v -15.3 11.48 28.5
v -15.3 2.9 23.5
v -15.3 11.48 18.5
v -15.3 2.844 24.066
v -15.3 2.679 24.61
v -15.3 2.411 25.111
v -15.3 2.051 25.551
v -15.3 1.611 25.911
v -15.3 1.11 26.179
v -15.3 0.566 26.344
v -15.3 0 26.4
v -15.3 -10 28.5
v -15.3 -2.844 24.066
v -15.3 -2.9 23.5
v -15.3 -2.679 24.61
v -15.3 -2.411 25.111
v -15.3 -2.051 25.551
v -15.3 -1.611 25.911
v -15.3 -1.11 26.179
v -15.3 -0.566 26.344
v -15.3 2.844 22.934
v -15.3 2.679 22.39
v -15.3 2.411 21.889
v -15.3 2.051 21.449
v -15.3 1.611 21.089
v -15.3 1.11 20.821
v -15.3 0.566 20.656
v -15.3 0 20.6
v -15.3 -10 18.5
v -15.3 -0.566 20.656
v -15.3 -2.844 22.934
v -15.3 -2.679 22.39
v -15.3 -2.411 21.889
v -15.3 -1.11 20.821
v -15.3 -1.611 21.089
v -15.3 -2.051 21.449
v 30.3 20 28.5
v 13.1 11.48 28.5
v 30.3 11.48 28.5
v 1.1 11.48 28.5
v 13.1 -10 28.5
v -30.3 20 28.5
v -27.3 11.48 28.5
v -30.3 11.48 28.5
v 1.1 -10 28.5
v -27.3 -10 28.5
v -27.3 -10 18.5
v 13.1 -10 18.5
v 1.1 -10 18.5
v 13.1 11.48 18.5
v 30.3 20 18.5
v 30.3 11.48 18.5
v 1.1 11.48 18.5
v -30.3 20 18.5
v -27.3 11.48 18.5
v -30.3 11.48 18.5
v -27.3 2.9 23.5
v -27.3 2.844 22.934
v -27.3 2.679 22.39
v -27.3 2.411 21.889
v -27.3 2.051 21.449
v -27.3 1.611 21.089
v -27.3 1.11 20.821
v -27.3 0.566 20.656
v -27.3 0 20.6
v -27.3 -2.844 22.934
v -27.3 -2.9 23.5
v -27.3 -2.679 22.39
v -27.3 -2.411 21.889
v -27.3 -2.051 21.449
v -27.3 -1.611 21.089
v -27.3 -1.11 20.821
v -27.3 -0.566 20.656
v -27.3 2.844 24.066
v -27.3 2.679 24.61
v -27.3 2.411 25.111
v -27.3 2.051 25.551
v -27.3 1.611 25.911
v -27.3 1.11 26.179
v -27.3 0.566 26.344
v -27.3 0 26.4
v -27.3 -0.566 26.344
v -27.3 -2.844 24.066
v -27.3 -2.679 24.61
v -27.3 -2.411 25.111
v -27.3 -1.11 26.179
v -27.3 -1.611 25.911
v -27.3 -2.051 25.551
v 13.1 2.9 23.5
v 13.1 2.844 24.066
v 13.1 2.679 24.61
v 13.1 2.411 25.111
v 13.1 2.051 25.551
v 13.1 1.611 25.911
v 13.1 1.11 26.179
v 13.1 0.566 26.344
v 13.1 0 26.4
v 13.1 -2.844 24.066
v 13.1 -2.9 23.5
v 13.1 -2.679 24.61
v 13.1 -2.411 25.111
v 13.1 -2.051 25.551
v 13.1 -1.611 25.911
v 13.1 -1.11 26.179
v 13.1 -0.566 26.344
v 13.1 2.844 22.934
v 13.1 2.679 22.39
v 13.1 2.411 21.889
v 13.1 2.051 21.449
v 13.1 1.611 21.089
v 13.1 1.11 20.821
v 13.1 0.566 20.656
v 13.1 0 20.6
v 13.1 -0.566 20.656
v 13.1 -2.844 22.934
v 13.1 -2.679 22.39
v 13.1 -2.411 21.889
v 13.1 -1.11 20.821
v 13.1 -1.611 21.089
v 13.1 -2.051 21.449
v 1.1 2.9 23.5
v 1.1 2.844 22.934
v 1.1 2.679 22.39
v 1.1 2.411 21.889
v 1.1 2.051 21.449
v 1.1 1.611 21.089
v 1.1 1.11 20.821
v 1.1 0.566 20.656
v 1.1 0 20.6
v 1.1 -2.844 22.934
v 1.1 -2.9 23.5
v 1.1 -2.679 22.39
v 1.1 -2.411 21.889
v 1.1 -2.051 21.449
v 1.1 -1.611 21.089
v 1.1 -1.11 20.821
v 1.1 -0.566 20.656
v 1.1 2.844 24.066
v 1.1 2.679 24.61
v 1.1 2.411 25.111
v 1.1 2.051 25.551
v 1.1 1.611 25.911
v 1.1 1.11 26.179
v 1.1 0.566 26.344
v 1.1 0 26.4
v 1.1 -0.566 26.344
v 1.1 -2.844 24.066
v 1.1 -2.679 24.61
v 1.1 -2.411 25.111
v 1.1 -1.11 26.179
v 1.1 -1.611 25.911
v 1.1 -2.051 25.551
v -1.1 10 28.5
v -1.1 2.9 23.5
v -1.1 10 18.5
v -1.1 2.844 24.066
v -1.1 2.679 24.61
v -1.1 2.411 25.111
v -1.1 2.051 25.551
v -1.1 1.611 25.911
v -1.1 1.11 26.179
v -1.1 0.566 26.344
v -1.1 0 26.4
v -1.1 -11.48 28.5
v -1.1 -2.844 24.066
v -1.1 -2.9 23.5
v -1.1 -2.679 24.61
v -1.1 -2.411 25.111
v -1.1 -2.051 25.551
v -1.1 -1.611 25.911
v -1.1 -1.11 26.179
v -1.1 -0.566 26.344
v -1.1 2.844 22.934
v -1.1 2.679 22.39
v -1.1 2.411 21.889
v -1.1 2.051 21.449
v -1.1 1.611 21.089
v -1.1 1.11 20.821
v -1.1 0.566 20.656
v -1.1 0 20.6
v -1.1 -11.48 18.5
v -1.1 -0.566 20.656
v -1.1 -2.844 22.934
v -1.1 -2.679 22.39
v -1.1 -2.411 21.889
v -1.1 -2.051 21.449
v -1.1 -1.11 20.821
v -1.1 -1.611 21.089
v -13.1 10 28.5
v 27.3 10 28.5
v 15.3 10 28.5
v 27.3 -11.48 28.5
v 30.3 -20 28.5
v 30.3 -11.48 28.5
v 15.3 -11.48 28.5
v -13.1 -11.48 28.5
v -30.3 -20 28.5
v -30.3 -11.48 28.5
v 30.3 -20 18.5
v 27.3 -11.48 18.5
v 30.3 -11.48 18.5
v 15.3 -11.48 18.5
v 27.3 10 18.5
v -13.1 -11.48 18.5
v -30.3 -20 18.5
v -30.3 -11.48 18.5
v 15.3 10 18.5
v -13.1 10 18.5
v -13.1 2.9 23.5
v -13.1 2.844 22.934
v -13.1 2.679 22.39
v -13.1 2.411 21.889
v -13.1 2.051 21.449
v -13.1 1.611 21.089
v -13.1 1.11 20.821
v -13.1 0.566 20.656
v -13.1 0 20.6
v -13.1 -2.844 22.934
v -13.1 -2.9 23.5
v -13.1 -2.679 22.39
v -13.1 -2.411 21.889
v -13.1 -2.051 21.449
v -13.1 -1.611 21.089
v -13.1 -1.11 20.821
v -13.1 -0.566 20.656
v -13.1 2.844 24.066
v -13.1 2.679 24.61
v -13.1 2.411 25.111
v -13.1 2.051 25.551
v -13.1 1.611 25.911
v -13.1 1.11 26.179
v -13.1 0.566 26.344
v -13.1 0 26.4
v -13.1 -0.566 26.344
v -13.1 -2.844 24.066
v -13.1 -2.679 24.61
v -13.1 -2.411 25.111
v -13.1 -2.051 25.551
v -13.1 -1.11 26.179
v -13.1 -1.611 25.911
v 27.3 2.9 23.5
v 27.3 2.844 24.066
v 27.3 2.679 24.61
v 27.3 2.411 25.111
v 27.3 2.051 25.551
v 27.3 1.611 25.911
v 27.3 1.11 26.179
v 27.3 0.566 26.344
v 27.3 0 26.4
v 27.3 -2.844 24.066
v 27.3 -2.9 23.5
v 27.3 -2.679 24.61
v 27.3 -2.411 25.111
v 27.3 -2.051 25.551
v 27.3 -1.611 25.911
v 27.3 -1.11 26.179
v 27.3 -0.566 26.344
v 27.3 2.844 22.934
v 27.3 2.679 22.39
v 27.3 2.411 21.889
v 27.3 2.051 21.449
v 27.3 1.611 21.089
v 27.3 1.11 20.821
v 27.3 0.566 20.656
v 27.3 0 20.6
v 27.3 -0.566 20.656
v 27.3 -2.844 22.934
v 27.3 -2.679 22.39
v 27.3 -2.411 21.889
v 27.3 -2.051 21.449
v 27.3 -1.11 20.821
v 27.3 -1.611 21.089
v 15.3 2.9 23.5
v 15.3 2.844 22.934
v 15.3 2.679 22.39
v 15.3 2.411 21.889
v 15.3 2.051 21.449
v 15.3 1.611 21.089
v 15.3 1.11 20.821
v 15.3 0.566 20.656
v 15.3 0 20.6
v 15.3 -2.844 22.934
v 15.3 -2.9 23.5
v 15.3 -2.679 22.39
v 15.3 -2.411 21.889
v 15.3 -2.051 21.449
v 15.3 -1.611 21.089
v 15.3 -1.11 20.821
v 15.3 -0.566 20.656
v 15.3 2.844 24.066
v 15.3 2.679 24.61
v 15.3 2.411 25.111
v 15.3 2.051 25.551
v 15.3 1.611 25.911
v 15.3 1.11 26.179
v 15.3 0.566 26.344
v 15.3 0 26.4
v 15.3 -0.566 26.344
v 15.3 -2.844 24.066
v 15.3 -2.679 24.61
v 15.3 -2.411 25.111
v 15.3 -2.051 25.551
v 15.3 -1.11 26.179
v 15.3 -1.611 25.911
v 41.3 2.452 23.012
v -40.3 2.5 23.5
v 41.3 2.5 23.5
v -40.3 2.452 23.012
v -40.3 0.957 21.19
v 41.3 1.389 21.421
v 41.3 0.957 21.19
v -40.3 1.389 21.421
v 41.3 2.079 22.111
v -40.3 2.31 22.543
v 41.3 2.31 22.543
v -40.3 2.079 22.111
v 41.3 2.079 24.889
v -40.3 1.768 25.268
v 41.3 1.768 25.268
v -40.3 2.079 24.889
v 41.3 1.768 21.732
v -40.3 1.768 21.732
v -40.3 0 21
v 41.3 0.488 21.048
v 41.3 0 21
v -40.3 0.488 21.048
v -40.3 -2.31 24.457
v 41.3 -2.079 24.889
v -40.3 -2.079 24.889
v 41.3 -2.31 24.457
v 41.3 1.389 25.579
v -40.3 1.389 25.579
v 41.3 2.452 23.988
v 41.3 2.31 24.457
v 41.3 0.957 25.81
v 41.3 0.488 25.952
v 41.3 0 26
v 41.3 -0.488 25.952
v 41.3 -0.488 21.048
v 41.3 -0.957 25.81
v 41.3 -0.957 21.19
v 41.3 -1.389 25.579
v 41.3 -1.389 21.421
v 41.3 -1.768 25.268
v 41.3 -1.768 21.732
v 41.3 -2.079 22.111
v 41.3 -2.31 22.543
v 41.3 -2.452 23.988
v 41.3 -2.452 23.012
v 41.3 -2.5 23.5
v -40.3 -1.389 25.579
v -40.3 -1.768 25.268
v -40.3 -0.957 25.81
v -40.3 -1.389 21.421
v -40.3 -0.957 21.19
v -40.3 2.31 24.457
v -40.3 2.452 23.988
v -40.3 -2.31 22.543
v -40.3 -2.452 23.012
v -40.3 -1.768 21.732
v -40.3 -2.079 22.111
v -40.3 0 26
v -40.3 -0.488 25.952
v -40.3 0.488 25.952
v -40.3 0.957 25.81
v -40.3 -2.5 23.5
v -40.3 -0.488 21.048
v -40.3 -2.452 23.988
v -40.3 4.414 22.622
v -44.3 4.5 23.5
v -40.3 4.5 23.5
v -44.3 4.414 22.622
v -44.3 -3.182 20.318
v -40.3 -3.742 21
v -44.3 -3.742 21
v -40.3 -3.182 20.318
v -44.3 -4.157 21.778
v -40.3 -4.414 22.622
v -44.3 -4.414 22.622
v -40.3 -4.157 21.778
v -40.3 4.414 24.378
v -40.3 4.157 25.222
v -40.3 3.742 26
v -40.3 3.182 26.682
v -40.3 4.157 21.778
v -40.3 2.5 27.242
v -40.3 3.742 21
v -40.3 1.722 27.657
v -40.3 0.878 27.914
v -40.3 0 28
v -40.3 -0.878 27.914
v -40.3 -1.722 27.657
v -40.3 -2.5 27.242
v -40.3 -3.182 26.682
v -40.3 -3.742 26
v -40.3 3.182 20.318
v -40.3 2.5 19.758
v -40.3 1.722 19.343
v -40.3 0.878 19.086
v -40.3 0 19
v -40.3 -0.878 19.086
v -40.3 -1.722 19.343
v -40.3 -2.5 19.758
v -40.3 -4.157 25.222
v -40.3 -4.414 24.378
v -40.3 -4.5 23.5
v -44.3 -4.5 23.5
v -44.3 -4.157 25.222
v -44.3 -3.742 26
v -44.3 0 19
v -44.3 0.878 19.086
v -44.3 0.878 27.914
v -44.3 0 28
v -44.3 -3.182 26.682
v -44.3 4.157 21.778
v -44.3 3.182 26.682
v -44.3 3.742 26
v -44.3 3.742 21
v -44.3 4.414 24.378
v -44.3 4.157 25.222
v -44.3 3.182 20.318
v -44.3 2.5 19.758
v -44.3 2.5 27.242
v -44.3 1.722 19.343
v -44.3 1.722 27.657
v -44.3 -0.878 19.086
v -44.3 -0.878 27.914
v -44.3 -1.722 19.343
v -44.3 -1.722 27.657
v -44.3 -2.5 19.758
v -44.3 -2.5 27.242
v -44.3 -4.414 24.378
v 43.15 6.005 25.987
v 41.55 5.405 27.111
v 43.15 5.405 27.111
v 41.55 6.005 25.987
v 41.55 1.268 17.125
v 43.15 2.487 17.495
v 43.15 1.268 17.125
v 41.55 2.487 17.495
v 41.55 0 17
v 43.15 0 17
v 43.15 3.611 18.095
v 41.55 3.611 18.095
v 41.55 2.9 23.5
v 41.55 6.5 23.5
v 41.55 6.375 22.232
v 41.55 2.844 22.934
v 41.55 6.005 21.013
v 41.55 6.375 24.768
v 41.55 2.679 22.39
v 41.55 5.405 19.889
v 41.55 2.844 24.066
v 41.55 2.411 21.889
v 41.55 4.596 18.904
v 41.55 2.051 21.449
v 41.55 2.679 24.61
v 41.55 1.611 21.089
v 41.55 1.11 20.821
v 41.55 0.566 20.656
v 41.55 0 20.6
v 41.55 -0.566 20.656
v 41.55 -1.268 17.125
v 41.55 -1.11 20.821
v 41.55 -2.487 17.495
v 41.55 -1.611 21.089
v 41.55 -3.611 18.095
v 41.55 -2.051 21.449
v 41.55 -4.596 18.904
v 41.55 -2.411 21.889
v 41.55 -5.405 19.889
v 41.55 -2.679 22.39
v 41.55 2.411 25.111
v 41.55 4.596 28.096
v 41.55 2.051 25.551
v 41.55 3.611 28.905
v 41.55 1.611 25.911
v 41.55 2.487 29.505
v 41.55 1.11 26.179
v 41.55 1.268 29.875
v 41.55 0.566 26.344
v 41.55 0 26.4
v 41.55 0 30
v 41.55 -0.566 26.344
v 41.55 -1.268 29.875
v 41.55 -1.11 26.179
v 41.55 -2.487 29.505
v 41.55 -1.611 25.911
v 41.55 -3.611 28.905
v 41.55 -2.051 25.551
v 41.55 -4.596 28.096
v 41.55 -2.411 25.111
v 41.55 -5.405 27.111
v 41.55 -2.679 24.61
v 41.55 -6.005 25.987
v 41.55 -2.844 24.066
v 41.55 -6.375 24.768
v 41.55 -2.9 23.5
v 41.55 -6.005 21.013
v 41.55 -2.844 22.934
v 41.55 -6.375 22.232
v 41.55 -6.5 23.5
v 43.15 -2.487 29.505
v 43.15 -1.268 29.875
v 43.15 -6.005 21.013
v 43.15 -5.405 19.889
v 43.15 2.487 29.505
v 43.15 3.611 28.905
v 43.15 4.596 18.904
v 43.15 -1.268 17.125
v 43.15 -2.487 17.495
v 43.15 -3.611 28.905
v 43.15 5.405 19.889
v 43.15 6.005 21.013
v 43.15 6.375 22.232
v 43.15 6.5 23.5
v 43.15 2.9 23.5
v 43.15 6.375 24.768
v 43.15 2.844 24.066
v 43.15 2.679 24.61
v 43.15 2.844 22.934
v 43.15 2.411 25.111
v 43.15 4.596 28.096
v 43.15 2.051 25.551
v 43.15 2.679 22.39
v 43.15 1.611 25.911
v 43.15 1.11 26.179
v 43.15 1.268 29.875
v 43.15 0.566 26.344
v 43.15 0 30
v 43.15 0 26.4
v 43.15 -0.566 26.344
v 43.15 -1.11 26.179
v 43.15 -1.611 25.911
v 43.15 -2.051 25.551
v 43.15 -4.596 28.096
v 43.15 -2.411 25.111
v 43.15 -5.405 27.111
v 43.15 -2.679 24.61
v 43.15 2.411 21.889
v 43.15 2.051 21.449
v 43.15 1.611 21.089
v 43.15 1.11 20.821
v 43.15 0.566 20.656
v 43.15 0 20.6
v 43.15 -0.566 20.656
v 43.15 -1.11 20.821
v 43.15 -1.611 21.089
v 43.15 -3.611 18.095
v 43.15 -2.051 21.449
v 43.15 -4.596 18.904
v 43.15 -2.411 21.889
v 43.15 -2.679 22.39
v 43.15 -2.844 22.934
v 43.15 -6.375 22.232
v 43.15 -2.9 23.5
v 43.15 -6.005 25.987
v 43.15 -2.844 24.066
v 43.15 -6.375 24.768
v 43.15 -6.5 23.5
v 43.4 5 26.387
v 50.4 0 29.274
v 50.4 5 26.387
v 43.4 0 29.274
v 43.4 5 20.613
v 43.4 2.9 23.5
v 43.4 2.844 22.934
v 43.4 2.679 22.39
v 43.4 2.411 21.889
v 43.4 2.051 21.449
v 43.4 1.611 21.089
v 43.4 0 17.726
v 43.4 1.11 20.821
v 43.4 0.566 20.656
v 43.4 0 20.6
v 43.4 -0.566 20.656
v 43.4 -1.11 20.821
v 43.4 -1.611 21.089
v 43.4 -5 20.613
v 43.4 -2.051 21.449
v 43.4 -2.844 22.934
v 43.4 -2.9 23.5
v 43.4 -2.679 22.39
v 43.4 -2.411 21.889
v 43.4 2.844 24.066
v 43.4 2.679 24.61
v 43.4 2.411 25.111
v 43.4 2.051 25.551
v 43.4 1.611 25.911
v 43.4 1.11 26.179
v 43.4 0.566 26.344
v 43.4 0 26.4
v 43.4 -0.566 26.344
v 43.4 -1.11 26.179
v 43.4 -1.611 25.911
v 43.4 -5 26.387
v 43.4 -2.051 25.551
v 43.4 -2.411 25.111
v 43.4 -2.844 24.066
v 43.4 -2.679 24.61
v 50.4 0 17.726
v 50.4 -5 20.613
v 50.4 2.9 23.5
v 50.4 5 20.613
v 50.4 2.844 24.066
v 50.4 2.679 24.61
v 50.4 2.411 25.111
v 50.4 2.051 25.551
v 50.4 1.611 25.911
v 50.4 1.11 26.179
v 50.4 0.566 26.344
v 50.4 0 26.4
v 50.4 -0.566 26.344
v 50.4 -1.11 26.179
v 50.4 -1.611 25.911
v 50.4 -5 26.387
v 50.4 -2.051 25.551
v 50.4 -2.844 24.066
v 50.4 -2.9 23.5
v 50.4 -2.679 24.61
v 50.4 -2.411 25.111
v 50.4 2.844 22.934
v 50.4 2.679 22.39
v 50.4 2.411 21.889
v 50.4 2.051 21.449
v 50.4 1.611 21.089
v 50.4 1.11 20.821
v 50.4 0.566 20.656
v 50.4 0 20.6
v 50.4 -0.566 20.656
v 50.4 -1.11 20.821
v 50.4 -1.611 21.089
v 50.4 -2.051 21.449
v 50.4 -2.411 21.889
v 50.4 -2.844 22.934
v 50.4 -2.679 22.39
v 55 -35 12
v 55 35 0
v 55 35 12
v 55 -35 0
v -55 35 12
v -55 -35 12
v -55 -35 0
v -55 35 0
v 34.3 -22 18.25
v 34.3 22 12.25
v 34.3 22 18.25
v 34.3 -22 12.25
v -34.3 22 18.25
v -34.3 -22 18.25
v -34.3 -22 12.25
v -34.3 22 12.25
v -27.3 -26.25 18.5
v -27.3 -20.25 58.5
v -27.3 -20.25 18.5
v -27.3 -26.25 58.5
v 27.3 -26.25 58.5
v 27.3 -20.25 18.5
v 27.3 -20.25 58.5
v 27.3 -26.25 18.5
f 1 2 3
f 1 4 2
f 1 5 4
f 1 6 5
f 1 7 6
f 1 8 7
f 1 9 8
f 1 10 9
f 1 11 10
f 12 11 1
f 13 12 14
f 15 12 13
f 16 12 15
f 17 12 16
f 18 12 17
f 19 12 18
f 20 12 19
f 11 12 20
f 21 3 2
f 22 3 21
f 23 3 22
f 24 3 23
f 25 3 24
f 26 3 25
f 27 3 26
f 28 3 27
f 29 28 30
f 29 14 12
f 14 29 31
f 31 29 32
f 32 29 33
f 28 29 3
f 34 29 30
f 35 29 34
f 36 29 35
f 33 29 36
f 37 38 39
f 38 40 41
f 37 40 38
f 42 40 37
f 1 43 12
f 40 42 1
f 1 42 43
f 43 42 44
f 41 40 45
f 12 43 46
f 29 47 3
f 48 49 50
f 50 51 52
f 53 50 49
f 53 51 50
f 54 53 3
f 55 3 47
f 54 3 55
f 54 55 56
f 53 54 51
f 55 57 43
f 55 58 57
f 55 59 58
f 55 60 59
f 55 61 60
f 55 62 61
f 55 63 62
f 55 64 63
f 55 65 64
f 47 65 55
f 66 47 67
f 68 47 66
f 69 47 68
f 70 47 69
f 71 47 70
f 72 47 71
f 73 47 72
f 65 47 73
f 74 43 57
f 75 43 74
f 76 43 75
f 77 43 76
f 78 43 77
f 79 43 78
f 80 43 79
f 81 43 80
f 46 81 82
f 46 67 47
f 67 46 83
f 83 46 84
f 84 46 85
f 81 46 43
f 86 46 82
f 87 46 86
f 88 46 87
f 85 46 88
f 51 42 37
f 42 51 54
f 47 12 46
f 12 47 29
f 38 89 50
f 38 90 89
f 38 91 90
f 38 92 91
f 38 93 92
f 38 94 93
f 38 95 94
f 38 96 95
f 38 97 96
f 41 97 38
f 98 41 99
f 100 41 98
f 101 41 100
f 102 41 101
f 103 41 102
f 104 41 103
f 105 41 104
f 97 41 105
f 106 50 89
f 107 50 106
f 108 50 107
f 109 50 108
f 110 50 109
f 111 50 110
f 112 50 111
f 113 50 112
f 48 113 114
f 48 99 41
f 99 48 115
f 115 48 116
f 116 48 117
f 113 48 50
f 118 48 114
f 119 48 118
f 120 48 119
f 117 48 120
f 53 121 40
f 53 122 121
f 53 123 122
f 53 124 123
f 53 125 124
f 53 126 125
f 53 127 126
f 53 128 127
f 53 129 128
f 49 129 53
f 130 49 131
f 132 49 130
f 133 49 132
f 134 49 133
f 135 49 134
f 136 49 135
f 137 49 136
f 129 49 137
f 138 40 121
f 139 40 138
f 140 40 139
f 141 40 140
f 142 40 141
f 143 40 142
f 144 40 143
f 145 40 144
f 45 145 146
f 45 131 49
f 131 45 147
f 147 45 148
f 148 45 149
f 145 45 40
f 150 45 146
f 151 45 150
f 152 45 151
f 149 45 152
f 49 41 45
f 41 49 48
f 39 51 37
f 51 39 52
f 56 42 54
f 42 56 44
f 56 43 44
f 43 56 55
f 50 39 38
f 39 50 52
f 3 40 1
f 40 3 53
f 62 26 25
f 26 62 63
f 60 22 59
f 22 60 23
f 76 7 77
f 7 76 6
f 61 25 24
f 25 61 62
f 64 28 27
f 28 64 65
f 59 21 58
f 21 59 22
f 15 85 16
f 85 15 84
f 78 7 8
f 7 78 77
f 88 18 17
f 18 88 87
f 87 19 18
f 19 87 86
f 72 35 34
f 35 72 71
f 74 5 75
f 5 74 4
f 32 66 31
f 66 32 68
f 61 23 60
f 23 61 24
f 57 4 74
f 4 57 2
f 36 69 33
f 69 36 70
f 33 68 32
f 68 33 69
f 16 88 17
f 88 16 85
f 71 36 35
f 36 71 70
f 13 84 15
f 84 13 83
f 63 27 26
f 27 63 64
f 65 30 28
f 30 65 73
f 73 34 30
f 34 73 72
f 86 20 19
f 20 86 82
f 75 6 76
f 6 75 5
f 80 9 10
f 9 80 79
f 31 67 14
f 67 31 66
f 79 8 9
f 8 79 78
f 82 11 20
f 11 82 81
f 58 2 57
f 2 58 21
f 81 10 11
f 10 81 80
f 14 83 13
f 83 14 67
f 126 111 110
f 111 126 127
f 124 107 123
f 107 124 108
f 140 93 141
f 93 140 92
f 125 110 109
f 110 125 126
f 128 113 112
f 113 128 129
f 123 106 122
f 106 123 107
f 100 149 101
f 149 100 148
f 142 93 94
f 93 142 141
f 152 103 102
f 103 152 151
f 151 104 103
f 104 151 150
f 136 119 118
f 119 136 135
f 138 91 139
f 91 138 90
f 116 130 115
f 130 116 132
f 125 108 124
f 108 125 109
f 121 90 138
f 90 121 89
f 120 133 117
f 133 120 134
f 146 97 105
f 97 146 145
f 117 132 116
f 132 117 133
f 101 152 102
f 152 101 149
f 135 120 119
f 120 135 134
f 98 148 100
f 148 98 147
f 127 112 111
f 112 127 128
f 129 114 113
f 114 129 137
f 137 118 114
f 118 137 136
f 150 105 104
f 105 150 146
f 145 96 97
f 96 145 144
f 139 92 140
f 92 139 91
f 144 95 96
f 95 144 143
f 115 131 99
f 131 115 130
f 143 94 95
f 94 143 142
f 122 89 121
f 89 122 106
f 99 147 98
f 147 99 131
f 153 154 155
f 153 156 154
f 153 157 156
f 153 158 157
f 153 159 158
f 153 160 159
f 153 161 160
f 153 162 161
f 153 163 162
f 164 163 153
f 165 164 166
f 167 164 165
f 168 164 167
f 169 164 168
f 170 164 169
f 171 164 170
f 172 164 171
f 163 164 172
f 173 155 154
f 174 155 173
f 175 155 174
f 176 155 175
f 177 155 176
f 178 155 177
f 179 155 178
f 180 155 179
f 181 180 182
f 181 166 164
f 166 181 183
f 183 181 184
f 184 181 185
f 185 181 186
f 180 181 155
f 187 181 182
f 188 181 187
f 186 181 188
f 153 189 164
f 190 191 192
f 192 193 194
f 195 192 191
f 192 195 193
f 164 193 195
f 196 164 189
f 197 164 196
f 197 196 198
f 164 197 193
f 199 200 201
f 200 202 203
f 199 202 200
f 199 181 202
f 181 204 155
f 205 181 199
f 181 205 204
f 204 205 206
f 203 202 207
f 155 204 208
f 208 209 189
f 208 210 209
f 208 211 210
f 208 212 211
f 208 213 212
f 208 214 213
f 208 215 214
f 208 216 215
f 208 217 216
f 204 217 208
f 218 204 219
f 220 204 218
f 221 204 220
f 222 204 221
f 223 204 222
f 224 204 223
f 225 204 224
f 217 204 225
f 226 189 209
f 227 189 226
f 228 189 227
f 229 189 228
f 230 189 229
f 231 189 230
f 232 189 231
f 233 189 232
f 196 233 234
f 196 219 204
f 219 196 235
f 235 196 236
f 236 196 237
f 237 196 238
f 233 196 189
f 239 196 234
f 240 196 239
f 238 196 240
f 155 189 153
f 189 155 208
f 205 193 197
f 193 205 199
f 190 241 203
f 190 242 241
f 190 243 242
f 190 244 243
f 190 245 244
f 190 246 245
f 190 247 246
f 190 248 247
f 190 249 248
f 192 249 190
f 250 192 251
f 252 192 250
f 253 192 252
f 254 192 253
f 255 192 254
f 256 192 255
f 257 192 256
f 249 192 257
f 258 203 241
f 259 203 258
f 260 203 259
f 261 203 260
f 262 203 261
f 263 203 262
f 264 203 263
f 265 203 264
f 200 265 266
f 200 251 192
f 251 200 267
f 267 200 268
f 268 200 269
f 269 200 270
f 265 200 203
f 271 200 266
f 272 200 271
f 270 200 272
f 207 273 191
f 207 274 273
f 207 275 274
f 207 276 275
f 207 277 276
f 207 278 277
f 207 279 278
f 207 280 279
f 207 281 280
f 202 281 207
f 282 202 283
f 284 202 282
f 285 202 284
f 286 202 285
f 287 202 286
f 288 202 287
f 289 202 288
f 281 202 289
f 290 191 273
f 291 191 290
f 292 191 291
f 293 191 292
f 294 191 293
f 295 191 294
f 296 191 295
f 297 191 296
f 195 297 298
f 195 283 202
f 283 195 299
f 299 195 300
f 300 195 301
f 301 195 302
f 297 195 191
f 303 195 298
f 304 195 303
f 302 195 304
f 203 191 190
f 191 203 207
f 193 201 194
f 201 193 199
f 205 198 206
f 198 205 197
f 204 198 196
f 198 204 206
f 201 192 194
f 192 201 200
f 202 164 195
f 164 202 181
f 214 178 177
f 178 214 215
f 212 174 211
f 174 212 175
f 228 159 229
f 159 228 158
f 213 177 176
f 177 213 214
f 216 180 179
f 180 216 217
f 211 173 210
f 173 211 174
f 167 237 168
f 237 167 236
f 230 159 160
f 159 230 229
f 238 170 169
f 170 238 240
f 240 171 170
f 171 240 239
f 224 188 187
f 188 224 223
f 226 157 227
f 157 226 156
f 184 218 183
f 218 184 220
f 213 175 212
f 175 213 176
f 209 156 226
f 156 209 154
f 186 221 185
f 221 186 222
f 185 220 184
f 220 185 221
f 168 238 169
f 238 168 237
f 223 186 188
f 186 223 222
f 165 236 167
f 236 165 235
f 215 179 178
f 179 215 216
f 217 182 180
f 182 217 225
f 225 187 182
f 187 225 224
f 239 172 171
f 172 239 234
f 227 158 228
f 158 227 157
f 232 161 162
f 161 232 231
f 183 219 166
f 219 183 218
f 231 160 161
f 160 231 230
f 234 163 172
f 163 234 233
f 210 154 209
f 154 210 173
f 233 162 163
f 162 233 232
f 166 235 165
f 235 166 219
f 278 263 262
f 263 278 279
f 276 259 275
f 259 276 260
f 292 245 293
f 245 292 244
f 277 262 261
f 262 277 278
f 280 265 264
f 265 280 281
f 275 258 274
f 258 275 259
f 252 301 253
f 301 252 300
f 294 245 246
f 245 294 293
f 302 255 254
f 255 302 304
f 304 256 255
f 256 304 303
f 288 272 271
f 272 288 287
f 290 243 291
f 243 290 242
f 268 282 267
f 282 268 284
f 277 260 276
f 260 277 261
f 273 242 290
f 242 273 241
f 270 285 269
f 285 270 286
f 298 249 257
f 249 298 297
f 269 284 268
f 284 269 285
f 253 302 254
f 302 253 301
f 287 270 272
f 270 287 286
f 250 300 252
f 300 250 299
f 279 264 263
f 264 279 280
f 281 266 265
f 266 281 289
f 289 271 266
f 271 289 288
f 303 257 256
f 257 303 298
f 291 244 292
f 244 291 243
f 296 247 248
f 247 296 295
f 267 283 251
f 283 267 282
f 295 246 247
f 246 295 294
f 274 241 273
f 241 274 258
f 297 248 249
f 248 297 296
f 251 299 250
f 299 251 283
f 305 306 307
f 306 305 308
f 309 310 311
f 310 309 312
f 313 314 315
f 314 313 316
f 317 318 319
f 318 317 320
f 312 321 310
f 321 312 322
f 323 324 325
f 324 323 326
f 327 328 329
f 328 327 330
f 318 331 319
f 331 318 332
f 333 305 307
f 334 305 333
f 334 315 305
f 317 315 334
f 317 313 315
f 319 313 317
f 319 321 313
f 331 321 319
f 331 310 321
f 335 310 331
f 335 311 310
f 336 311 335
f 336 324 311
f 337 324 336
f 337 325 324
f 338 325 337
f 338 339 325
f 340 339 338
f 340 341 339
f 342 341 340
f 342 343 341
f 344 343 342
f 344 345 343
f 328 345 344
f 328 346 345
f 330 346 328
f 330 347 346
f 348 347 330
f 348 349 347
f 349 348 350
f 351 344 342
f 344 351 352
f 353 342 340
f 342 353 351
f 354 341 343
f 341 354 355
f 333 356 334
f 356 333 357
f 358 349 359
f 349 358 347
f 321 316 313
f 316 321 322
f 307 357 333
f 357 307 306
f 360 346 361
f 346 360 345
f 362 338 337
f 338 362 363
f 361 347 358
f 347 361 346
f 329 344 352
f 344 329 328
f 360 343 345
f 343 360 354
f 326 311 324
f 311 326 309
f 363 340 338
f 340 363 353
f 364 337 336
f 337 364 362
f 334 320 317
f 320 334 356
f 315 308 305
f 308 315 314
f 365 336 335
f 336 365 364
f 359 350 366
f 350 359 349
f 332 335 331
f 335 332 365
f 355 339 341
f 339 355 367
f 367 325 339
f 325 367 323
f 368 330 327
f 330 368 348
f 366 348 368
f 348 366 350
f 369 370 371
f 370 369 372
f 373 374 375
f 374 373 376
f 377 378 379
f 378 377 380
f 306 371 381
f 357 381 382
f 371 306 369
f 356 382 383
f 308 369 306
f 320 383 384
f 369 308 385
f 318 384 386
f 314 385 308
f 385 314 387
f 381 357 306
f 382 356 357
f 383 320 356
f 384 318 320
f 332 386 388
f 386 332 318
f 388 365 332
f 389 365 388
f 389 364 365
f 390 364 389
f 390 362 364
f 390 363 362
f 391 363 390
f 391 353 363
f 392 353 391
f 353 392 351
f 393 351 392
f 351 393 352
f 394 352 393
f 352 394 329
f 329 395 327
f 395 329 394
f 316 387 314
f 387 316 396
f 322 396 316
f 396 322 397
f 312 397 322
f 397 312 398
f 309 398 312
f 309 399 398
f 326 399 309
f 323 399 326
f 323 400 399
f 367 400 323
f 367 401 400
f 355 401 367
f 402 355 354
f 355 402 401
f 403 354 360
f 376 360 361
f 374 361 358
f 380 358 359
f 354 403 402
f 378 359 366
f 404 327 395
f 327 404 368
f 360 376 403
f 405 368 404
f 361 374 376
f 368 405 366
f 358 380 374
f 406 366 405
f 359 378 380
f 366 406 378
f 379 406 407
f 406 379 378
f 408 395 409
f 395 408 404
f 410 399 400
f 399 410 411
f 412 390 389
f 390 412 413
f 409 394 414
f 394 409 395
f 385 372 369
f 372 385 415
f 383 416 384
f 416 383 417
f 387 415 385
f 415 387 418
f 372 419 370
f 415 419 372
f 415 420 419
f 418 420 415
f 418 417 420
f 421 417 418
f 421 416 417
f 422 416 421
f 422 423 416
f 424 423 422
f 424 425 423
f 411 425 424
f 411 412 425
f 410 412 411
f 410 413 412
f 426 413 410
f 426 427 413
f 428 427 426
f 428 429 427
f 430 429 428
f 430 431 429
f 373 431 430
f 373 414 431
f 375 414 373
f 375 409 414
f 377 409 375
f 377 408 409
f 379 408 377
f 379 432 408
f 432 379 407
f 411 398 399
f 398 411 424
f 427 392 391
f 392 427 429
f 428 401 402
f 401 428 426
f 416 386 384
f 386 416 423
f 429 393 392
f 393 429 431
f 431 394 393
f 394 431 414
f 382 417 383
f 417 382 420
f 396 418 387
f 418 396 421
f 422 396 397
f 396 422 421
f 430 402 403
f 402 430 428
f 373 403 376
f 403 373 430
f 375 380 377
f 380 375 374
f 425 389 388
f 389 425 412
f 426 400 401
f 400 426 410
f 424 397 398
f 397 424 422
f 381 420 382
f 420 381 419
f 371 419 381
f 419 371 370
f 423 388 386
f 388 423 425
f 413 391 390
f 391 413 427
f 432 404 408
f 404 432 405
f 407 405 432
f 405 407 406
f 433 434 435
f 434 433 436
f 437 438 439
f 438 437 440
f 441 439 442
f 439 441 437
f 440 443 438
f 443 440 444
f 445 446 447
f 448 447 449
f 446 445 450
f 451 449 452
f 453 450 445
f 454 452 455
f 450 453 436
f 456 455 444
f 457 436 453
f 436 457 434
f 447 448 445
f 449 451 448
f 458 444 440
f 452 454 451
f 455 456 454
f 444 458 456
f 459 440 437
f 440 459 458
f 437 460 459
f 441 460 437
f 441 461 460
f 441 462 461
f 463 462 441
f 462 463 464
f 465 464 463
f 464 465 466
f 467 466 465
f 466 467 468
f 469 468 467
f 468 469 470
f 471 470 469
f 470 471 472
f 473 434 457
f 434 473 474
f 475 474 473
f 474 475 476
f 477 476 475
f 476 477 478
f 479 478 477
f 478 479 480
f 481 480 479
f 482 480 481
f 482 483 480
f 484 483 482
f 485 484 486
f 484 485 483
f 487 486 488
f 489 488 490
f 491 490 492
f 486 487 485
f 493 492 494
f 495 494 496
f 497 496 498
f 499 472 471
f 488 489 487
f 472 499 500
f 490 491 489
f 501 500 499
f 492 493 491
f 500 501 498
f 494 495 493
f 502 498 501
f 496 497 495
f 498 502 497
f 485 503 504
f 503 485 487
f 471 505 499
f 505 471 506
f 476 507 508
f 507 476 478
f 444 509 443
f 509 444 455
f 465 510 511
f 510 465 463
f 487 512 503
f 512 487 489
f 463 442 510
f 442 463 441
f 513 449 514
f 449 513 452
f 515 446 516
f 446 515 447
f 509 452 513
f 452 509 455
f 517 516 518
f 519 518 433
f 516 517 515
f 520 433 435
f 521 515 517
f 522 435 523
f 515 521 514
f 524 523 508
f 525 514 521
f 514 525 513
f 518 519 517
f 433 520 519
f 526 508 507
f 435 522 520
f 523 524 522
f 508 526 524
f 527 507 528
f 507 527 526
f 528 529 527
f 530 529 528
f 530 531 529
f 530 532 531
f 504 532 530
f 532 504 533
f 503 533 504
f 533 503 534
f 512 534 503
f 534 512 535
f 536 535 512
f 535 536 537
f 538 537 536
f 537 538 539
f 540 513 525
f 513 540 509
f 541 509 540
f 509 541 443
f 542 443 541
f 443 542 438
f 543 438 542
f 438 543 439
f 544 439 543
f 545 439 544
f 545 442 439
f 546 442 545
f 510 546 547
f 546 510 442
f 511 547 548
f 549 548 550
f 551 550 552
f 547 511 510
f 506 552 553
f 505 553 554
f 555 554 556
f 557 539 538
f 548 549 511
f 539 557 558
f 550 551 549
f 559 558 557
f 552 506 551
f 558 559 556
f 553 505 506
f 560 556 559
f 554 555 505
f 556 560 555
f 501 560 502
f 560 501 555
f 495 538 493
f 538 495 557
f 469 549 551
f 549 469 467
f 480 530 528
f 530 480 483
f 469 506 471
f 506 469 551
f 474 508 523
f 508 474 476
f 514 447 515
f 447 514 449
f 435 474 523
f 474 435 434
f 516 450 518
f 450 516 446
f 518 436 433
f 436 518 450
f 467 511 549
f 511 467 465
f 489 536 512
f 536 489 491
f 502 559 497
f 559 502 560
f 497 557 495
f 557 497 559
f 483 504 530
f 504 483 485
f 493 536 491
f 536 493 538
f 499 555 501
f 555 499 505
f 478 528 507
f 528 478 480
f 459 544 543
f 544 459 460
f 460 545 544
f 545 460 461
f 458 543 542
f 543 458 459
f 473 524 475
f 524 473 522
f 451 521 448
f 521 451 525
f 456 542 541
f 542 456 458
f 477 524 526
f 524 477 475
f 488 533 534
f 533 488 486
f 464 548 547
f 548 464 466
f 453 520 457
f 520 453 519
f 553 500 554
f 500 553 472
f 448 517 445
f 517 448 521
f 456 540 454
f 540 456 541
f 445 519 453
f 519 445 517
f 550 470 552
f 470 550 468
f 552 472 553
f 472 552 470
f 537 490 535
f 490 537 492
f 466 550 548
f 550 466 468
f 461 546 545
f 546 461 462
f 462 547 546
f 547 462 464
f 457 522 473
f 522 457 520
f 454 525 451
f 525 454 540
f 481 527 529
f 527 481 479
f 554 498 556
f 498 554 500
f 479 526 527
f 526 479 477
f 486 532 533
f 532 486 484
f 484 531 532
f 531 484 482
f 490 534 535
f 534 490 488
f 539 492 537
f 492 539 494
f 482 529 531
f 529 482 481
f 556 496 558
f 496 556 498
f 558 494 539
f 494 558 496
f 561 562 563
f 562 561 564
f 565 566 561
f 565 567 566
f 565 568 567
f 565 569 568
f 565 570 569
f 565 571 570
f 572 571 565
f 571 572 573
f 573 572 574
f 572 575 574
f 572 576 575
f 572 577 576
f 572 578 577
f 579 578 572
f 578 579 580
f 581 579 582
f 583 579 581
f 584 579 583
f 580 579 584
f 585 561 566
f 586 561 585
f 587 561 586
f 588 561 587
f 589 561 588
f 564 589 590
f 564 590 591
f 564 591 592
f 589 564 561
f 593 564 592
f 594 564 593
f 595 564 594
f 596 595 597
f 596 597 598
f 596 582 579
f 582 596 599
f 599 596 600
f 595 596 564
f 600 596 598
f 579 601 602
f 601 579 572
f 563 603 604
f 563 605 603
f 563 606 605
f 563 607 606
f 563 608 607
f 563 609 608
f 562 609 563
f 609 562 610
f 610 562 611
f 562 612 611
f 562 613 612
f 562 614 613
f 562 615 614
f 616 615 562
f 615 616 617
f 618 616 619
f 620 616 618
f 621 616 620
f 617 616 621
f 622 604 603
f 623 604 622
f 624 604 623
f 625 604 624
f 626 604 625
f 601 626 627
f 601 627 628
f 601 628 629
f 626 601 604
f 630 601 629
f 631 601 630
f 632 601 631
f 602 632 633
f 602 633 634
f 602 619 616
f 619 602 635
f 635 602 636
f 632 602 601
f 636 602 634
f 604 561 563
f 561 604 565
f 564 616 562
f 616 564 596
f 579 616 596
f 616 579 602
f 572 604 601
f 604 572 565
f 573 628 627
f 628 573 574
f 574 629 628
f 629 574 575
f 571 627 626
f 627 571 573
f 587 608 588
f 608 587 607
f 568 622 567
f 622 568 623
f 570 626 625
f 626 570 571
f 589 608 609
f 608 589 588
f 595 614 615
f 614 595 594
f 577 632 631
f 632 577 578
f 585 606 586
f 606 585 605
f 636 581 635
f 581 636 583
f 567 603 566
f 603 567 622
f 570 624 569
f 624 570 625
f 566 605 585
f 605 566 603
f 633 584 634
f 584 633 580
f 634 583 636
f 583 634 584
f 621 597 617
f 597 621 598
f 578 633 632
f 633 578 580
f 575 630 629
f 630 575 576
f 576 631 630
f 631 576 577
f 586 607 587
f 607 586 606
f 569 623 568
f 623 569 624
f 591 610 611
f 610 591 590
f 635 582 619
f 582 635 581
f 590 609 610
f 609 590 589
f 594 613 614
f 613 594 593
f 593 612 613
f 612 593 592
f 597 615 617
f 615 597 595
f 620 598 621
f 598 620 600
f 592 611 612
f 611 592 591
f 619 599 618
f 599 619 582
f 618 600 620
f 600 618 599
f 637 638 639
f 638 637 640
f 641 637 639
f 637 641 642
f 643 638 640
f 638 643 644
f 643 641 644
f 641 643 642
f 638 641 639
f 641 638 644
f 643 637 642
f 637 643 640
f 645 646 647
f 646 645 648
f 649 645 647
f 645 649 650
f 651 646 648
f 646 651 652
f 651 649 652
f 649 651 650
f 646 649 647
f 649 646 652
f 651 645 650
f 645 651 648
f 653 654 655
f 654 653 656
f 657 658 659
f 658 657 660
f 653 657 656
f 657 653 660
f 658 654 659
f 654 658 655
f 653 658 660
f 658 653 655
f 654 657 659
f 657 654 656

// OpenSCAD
$fn = 32;

// ------------------------------------------------------------------------
// Comb hinge with flap: leaf 60.6 x 20 mm, pin d5, flap 40 mm
// Every part is its own module, assembly() places every instance.
// ------------------------------------------------------------------------

// --- part 1 ---
module hinge_bed() {
  difference() {
    translate([-55, -35, 0]) cube([110, 70, 12]);
  }
}

// --- part 2 ---
module hinge_riser() {
  difference() {
    translate([-34.3, -22, 0]) cube([68.6, 44, 6]);
  }
}

// --- part 3 ---
module hinge_leaf_a() {
  difference() {
    union() {
      translate([-27.3, -10, -5]) cube([12, 30, 10]);
      translate([1.1, -10, -5]) cube([12, 30, 10]);
      translate([-30.3, 11.48, -5]) cube([60.6, 8.52, 10]);
    }
    translate([-21.3, 0, 0]) rotate([0, 90, 0]) cylinder(h = 14, d = 5.8, center = true);
    translate([7.1, 0, 0]) rotate([0, 90, 0]) cylinder(h = 14, d = 5.8, center = true);
  }
}

// --- part 4 ---
module hinge_leaf_b() {
  difference() {
    union() {
      translate([-13.1, -20, -5]) cube([12, 30, 10]);
      translate([15.3, -20, -5]) cube([12, 30, 10]);
      translate([-30.3, -20, -5]) cube([60.6, 8.52, 10]);
    }
    translate([-7.1, 0, 0]) rotate([0, 90, 0]) cylinder(h = 14, d = 5.8, center = true);
    translate([21.3, 0, 0]) rotate([0, 90, 0]) cylinder(h = 14, d = 5.8, center = true);
  }
}

// --- part 5 ---
module hinge_flap() {
  difference() {
    translate([-27.3, -20, 0]) cube([54.6, 40, 6]);
  }
}

// --- part 6 ---
module hinge_pin() {
  rotate([0, 90, 0]) cylinder(h = 82.6, d = 5, center = true);
  translate([-44.3, 0, 0]) rotate([0, 90, 0]) cylinder(h = 4, d = 9);
}

// --- part 7 ---
module pin_washer() {
  difference() {
      translate([0, 0, 0]) cylinder(h = 1.6, d = 13);
      translate([0, 0, -1]) cylinder(h = 3.6, d = 5.8);
    }
}

// --- part 8 ---
module pin_nut() {
  difference() {
    linear_extrude(height = 7) polygon(points = [[5.774, 0], [2.887, 5], [-2.887, 5], [-5.774, 0], [-2.887, -5], [2.887, -5]]);
    translate([0, 0, -1]) cylinder(h = 9, d = 5.8);
  }
}

// --- assembly ---
module assembly() {
  color([0.80, 0.24, 0.20]) translate([0, 0, 0]) rotate([0, 0, 0]) hinge_bed();
  color([0.20, 0.45, 0.75]) translate([0, 0, 12.25]) rotate([0, 0, 0]) hinge_riser();
  color([0.25, 0.62, 0.32]) translate([0, 0, 23.5]) rotate([0, 0, 0]) hinge_leaf_a();
  color([0.92, 0.70, 0.18]) translate([0, 0, 23.5]) rotate([0, 0, 0]) hinge_leaf_b();
  color([0.58, 0.35, 0.70]) translate([0, -20.25, 38.5]) rotate([90, 0, 0]) hinge_flap();
  color([0.16, 0.66, 0.66]) translate([0, 0, 23.5]) rotate([0, 0, 0]) hinge_pin();
  color([0.85, 0.48, 0.18]) translate([41.55, 0, 23.5]) rotate([0, 90, 0]) pin_washer();
  color([0.55, 0.60, 0.65]) translate([43.4, 0, 23.5]) rotate([0, 90, 0]) pin_nut();
}

assembly();
